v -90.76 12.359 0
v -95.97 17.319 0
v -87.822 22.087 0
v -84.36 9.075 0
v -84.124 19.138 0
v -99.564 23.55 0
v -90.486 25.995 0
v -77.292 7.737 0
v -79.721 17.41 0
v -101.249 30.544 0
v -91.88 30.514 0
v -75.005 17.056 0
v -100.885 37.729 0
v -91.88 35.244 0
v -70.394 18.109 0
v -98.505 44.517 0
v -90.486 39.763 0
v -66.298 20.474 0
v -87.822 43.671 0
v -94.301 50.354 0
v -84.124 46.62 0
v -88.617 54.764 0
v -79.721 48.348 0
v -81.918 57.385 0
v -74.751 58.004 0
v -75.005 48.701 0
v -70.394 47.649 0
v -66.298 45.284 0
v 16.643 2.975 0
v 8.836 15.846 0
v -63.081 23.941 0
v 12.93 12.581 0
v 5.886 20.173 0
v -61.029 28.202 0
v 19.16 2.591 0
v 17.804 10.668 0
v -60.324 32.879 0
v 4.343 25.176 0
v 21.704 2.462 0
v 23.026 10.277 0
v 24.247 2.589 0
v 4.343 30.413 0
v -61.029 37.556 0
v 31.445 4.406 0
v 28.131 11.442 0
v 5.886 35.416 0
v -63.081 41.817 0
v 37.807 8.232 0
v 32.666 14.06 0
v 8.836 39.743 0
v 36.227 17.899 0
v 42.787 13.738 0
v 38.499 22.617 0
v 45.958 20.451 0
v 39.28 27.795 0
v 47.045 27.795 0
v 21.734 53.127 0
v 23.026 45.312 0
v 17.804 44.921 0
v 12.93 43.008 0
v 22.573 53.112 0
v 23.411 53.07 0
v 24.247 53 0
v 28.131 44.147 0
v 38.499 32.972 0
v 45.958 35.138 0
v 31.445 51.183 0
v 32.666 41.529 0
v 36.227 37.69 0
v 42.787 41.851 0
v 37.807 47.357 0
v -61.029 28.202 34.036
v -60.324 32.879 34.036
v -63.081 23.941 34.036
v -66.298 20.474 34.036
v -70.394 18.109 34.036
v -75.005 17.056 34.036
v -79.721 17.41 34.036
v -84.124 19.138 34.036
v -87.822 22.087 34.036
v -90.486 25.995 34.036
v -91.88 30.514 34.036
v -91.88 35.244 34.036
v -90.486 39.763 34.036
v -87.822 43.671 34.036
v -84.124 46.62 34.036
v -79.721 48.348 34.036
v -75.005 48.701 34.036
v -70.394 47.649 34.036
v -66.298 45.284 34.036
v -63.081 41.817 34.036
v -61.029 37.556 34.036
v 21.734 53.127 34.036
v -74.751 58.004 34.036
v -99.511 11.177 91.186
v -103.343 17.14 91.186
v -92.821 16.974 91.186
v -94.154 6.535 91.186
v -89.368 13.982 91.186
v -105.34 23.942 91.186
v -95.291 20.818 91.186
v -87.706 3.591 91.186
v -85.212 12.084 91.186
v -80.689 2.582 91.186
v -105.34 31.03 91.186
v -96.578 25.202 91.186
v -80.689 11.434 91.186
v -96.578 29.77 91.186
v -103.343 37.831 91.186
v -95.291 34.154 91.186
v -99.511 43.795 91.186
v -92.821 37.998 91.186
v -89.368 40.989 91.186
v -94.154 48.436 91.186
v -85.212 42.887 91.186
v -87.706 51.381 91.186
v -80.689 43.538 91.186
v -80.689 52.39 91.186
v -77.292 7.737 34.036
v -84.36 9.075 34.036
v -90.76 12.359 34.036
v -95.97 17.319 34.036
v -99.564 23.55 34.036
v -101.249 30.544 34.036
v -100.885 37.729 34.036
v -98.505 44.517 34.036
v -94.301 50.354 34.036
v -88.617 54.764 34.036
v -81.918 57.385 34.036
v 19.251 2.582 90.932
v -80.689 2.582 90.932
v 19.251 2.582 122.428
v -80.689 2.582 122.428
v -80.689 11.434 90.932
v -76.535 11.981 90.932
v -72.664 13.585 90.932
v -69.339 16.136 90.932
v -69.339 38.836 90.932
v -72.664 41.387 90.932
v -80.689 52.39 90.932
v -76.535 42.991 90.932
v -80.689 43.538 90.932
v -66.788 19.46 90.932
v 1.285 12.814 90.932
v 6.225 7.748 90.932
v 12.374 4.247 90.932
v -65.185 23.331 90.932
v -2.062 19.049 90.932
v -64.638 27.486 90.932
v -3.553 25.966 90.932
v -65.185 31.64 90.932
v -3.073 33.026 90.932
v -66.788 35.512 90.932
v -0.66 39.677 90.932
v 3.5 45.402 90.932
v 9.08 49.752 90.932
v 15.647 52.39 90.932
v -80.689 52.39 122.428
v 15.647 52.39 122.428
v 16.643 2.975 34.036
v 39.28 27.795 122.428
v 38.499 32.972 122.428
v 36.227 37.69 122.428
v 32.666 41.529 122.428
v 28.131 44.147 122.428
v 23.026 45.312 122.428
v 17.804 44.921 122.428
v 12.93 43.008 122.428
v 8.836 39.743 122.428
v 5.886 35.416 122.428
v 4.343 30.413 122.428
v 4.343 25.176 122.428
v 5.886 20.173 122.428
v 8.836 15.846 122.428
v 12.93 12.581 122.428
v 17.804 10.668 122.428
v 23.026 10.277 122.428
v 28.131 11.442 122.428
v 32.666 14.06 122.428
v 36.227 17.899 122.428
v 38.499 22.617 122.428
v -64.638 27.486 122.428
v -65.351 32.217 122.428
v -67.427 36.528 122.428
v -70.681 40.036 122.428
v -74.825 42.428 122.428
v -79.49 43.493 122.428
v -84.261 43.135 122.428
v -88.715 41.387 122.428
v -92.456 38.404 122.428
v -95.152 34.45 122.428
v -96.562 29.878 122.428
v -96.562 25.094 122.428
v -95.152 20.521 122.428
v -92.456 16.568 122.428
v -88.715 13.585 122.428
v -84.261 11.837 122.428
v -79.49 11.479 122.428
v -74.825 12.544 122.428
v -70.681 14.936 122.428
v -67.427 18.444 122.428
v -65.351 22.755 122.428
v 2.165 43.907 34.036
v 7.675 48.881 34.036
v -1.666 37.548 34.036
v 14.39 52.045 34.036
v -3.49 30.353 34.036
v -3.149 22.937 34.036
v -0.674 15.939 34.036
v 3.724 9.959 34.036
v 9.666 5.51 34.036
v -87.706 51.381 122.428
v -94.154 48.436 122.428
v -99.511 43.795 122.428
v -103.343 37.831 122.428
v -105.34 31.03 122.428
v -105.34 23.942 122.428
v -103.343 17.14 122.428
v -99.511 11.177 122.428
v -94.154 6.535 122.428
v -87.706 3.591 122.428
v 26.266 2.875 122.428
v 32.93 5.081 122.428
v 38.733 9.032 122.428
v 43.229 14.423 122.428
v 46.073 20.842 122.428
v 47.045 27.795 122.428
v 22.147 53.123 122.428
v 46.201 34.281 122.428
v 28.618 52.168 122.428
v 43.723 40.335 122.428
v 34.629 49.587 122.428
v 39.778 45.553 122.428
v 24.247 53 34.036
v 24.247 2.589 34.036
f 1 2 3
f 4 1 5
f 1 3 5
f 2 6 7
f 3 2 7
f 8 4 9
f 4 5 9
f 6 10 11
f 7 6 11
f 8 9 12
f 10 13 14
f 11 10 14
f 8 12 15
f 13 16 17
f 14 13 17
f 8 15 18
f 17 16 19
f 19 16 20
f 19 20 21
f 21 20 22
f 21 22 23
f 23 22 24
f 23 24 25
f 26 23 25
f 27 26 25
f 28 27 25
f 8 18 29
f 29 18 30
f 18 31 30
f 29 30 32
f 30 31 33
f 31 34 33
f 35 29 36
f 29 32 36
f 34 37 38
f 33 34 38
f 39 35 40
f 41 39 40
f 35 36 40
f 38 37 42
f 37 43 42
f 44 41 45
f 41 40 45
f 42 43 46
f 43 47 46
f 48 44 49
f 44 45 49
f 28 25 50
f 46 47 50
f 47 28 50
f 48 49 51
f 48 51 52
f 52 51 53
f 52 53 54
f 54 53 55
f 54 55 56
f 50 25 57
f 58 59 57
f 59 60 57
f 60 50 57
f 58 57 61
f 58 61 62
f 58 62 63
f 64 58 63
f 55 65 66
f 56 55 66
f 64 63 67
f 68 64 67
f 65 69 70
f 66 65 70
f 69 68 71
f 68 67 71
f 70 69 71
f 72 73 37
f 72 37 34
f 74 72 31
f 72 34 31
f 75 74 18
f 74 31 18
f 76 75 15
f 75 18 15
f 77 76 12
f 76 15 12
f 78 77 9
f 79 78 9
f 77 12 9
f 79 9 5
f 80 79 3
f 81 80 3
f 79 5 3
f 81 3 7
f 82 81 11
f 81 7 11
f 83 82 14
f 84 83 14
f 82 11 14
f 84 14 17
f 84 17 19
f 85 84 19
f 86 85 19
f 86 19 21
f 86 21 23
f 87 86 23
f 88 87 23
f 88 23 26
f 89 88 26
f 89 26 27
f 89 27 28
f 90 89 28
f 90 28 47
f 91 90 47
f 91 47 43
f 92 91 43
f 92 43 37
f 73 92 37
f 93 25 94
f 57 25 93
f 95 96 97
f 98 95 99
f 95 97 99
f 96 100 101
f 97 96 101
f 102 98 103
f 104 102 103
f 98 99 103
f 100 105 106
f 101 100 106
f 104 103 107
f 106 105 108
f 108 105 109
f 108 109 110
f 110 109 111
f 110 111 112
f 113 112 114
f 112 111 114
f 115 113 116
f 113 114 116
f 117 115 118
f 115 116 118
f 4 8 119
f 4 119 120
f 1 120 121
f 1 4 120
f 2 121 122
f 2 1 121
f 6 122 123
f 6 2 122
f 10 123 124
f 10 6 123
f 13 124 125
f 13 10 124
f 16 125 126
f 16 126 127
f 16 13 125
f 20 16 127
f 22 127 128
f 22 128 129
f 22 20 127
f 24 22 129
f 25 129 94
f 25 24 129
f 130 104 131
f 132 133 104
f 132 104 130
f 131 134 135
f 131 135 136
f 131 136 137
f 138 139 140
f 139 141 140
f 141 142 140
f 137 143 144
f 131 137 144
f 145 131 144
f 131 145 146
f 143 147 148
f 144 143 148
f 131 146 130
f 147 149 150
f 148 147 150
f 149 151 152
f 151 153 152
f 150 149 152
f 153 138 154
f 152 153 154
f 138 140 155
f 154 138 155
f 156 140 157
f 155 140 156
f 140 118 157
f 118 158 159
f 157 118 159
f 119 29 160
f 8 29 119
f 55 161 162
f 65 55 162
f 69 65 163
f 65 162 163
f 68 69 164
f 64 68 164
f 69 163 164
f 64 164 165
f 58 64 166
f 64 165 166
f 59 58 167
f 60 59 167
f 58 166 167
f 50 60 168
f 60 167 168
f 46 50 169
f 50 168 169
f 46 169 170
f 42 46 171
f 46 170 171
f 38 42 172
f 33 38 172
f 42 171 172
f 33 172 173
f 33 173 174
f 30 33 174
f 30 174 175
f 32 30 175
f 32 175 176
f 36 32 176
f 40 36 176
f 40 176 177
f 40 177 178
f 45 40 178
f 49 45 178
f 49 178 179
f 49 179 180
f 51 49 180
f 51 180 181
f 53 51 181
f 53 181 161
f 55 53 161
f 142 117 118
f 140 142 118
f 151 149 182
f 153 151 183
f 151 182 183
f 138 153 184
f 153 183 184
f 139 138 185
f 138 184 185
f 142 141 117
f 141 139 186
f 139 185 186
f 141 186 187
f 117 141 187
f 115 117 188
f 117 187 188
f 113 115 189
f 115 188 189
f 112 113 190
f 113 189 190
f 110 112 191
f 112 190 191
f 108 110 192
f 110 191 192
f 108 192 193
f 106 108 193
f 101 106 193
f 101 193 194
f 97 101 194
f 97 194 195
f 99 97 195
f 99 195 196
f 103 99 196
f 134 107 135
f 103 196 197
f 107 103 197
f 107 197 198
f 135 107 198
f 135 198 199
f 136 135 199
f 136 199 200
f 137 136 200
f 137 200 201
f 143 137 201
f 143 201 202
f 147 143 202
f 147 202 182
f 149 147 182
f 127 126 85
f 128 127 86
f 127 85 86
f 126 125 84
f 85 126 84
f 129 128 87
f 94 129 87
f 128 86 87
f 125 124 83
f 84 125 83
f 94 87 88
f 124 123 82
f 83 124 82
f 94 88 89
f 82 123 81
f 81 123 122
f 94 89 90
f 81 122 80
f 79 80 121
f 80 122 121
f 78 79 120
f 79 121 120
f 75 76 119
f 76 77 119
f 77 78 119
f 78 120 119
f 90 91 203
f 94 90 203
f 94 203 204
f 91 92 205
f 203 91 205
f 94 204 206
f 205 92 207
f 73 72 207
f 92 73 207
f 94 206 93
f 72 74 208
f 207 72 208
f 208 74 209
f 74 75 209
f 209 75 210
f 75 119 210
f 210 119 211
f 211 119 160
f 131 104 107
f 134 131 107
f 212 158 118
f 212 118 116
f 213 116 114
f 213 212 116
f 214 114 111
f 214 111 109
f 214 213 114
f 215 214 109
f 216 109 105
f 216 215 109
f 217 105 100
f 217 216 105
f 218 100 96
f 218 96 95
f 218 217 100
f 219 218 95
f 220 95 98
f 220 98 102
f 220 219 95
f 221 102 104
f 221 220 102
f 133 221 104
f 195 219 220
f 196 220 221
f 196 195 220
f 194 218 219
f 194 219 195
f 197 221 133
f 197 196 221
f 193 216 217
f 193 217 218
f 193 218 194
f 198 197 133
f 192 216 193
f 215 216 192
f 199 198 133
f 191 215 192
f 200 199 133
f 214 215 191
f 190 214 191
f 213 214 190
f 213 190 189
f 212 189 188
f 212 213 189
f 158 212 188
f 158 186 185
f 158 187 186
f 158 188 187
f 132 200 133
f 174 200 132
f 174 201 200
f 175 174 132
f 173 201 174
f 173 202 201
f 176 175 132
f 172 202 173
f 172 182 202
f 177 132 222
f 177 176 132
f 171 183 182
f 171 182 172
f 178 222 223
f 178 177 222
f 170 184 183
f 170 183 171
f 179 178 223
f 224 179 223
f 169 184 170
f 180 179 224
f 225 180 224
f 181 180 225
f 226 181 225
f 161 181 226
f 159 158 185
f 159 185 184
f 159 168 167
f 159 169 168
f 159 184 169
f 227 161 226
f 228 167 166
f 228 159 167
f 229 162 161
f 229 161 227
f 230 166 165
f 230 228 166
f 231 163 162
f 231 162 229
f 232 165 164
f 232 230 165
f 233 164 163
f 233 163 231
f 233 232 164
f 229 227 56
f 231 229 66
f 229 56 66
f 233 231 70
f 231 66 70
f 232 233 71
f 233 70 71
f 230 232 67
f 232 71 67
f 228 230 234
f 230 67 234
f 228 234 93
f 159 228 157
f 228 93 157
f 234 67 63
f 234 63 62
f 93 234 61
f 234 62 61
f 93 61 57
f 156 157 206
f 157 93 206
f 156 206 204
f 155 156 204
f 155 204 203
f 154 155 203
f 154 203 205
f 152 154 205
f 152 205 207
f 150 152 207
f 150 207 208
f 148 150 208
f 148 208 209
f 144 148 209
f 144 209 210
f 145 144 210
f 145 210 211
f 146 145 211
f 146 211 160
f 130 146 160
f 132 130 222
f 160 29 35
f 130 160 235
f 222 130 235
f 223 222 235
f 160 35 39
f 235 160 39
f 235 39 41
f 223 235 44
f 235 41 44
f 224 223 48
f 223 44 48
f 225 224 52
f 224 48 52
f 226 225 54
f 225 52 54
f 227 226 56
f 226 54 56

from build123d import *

# Parameters (mm, degrees)
F0_R      = 25.332369153
F1_DEPTH  = 122.428
F3_DEPTH  = 34.036
F4_R      = 25.1663808995
F5_DEPTH  = 34.036
F6_W      = 99.9408867977
F6_H      = 49.807743342
F7_DEPTH  = 31.496
F9_DEPTH  = 31.242
F11_R     = 15.866808683
F12_DEPTH = 52.832
F10_R     = 16.051664823
F13_DEPTH = 70.104
F14_R     = 17.5666522391
F15_DEPTH = 262.382


with BuildPart() as f1:
    # F0 (on Top) → F1 (new body)
    with BuildSketch(Plane.XY):
        with Locations((21.7129960656, 27.794552967)):
            Circle(F0_R)
    extrude(amount=F1_DEPTH)

    # F2 (on face) → F3 (join)
    with BuildSketch(Plane(origin=(0, 0, 0), x_dir=(1, 0, 0), z_dir=(0, 0, -1))):
        with BuildLine():
            ThreePointArc((24.2469048948, -42.8027561924), (33.3369903631, -37.6205193104), (36.9336024271, -27.794552967))
            ThreePointArc((36.9336024271, -27.794552967), (33.3369903631, -17.9685866235), (24.2469048948, -12.7863497415))
            Line((24.2469048948, -12.7863497415), (24.2469048948, -42.8027561924))
        make_face()
        with BuildLine():
            Line((24.2469048948, -42.8027561924), (24.2469048948, -12.7863497415))
            ThreePointArc((24.2469048948, -12.7863497415), (6.4923897041, -27.794552967), (24.2469048948, -42.8027561924))
        make_face()
        with BuildLine():
            ThreePointArc((24.2469048948, -42.8027561924), (6.4923897041, -27.794552967), (24.2469048948, -12.7863497415))
            Line((24.2469048948, -12.7863497415), (24.2469048948, -2.5892314465))
            Line((24.2469048948, -2.5892314465), (-77.2918909788, -7.7366237529))
            Line((-77.2918909788, -7.7366237529), (-75.0896409154, -58.021184057))
            Line((-75.0896409154, -58.021184057), (24.2469048948, -52.9998744874))
            Line((24.2469048948, -52.9998744874), (24.2469048948, -42.8027561924))
        make_face()
        with BuildLine():
            ThreePointArc((21.7336893247, -53.1269136681), (-3.4898764651, -30.3527052507), (16.6431184636, -2.9746966417))
            Line((16.6431184636, -2.9746966417), (-77.2918909788, -7.7366237529))
            Line((-77.2918909788, -7.7366237529), (-75.0896409154, -58.021184057))
            Line((-75.0896409154, -58.021184057), (21.7336893247, -53.1269136681))
        make_face()
    extrude(amount=-F3_DEPTH)

    # F4 (on face) → F5 (join)
    with BuildSketch(Plane(origin=(0, 0, 0), x_dir=(1, 0, 0), z_dir=(0, 0, -1))):
        with Locations((-76.1907659471, -32.8789039049)):
            Circle(F4_R)
    extrude(amount=-F5_DEPTH)

    # F6 (on face) → F7 (join)
    with BuildSketch(Plane.XY.offset(122.428)):
        with Locations((-30.7190240909, 27.4859363282)):
            Rectangle(F6_W, F6_H)
    extrude(amount=-F7_DEPTH)

    # F8 (on face) → F9 (join)
    with BuildSketch(Plane.XY.offset(122.428)):
        with BuildLine():
            Line((-80.6894674897, 2.5820646572), (-80.6894674897, 52.3898079991))
            ThreePointArc((-80.6894674897, 52.3898079991), (-105.5933391607, 27.4859363282), (-80.6894674897, 2.5820646572))
        make_face()
    extrude(amount=-F9_DEPTH)

    # F11 (on face) → F12 (cut)
    with BuildSketch(Plane(origin=(0, 0, 0), x_dir=(1, 0, 0), z_dir=(0, 0, -1))):
        with Locations((-76.1907659471, -32.8789039049)):
            Circle(F11_R)
    extrude(amount=-F12_DEPTH, mode=Mode.SUBTRACT)

    # F10 (on face) → F13 (cut)
    with BuildSketch(Plane.XY.offset(122.428)):
        with Locations((-80.6894674897, 27.4859363282)):
            Circle(F10_R)
    extrude(amount=-F13_DEPTH, mode=Mode.SUBTRACT)

    # F14 (on face) → F15 (cut)
    with BuildSketch(Plane.XY.offset(122.428)):
        with Locations((21.7129960656, 27.794552967)):
            Circle(F14_R)
    extrude(amount=-F15_DEPTH, mode=Mode.SUBTRACT)


solid = f1.part
